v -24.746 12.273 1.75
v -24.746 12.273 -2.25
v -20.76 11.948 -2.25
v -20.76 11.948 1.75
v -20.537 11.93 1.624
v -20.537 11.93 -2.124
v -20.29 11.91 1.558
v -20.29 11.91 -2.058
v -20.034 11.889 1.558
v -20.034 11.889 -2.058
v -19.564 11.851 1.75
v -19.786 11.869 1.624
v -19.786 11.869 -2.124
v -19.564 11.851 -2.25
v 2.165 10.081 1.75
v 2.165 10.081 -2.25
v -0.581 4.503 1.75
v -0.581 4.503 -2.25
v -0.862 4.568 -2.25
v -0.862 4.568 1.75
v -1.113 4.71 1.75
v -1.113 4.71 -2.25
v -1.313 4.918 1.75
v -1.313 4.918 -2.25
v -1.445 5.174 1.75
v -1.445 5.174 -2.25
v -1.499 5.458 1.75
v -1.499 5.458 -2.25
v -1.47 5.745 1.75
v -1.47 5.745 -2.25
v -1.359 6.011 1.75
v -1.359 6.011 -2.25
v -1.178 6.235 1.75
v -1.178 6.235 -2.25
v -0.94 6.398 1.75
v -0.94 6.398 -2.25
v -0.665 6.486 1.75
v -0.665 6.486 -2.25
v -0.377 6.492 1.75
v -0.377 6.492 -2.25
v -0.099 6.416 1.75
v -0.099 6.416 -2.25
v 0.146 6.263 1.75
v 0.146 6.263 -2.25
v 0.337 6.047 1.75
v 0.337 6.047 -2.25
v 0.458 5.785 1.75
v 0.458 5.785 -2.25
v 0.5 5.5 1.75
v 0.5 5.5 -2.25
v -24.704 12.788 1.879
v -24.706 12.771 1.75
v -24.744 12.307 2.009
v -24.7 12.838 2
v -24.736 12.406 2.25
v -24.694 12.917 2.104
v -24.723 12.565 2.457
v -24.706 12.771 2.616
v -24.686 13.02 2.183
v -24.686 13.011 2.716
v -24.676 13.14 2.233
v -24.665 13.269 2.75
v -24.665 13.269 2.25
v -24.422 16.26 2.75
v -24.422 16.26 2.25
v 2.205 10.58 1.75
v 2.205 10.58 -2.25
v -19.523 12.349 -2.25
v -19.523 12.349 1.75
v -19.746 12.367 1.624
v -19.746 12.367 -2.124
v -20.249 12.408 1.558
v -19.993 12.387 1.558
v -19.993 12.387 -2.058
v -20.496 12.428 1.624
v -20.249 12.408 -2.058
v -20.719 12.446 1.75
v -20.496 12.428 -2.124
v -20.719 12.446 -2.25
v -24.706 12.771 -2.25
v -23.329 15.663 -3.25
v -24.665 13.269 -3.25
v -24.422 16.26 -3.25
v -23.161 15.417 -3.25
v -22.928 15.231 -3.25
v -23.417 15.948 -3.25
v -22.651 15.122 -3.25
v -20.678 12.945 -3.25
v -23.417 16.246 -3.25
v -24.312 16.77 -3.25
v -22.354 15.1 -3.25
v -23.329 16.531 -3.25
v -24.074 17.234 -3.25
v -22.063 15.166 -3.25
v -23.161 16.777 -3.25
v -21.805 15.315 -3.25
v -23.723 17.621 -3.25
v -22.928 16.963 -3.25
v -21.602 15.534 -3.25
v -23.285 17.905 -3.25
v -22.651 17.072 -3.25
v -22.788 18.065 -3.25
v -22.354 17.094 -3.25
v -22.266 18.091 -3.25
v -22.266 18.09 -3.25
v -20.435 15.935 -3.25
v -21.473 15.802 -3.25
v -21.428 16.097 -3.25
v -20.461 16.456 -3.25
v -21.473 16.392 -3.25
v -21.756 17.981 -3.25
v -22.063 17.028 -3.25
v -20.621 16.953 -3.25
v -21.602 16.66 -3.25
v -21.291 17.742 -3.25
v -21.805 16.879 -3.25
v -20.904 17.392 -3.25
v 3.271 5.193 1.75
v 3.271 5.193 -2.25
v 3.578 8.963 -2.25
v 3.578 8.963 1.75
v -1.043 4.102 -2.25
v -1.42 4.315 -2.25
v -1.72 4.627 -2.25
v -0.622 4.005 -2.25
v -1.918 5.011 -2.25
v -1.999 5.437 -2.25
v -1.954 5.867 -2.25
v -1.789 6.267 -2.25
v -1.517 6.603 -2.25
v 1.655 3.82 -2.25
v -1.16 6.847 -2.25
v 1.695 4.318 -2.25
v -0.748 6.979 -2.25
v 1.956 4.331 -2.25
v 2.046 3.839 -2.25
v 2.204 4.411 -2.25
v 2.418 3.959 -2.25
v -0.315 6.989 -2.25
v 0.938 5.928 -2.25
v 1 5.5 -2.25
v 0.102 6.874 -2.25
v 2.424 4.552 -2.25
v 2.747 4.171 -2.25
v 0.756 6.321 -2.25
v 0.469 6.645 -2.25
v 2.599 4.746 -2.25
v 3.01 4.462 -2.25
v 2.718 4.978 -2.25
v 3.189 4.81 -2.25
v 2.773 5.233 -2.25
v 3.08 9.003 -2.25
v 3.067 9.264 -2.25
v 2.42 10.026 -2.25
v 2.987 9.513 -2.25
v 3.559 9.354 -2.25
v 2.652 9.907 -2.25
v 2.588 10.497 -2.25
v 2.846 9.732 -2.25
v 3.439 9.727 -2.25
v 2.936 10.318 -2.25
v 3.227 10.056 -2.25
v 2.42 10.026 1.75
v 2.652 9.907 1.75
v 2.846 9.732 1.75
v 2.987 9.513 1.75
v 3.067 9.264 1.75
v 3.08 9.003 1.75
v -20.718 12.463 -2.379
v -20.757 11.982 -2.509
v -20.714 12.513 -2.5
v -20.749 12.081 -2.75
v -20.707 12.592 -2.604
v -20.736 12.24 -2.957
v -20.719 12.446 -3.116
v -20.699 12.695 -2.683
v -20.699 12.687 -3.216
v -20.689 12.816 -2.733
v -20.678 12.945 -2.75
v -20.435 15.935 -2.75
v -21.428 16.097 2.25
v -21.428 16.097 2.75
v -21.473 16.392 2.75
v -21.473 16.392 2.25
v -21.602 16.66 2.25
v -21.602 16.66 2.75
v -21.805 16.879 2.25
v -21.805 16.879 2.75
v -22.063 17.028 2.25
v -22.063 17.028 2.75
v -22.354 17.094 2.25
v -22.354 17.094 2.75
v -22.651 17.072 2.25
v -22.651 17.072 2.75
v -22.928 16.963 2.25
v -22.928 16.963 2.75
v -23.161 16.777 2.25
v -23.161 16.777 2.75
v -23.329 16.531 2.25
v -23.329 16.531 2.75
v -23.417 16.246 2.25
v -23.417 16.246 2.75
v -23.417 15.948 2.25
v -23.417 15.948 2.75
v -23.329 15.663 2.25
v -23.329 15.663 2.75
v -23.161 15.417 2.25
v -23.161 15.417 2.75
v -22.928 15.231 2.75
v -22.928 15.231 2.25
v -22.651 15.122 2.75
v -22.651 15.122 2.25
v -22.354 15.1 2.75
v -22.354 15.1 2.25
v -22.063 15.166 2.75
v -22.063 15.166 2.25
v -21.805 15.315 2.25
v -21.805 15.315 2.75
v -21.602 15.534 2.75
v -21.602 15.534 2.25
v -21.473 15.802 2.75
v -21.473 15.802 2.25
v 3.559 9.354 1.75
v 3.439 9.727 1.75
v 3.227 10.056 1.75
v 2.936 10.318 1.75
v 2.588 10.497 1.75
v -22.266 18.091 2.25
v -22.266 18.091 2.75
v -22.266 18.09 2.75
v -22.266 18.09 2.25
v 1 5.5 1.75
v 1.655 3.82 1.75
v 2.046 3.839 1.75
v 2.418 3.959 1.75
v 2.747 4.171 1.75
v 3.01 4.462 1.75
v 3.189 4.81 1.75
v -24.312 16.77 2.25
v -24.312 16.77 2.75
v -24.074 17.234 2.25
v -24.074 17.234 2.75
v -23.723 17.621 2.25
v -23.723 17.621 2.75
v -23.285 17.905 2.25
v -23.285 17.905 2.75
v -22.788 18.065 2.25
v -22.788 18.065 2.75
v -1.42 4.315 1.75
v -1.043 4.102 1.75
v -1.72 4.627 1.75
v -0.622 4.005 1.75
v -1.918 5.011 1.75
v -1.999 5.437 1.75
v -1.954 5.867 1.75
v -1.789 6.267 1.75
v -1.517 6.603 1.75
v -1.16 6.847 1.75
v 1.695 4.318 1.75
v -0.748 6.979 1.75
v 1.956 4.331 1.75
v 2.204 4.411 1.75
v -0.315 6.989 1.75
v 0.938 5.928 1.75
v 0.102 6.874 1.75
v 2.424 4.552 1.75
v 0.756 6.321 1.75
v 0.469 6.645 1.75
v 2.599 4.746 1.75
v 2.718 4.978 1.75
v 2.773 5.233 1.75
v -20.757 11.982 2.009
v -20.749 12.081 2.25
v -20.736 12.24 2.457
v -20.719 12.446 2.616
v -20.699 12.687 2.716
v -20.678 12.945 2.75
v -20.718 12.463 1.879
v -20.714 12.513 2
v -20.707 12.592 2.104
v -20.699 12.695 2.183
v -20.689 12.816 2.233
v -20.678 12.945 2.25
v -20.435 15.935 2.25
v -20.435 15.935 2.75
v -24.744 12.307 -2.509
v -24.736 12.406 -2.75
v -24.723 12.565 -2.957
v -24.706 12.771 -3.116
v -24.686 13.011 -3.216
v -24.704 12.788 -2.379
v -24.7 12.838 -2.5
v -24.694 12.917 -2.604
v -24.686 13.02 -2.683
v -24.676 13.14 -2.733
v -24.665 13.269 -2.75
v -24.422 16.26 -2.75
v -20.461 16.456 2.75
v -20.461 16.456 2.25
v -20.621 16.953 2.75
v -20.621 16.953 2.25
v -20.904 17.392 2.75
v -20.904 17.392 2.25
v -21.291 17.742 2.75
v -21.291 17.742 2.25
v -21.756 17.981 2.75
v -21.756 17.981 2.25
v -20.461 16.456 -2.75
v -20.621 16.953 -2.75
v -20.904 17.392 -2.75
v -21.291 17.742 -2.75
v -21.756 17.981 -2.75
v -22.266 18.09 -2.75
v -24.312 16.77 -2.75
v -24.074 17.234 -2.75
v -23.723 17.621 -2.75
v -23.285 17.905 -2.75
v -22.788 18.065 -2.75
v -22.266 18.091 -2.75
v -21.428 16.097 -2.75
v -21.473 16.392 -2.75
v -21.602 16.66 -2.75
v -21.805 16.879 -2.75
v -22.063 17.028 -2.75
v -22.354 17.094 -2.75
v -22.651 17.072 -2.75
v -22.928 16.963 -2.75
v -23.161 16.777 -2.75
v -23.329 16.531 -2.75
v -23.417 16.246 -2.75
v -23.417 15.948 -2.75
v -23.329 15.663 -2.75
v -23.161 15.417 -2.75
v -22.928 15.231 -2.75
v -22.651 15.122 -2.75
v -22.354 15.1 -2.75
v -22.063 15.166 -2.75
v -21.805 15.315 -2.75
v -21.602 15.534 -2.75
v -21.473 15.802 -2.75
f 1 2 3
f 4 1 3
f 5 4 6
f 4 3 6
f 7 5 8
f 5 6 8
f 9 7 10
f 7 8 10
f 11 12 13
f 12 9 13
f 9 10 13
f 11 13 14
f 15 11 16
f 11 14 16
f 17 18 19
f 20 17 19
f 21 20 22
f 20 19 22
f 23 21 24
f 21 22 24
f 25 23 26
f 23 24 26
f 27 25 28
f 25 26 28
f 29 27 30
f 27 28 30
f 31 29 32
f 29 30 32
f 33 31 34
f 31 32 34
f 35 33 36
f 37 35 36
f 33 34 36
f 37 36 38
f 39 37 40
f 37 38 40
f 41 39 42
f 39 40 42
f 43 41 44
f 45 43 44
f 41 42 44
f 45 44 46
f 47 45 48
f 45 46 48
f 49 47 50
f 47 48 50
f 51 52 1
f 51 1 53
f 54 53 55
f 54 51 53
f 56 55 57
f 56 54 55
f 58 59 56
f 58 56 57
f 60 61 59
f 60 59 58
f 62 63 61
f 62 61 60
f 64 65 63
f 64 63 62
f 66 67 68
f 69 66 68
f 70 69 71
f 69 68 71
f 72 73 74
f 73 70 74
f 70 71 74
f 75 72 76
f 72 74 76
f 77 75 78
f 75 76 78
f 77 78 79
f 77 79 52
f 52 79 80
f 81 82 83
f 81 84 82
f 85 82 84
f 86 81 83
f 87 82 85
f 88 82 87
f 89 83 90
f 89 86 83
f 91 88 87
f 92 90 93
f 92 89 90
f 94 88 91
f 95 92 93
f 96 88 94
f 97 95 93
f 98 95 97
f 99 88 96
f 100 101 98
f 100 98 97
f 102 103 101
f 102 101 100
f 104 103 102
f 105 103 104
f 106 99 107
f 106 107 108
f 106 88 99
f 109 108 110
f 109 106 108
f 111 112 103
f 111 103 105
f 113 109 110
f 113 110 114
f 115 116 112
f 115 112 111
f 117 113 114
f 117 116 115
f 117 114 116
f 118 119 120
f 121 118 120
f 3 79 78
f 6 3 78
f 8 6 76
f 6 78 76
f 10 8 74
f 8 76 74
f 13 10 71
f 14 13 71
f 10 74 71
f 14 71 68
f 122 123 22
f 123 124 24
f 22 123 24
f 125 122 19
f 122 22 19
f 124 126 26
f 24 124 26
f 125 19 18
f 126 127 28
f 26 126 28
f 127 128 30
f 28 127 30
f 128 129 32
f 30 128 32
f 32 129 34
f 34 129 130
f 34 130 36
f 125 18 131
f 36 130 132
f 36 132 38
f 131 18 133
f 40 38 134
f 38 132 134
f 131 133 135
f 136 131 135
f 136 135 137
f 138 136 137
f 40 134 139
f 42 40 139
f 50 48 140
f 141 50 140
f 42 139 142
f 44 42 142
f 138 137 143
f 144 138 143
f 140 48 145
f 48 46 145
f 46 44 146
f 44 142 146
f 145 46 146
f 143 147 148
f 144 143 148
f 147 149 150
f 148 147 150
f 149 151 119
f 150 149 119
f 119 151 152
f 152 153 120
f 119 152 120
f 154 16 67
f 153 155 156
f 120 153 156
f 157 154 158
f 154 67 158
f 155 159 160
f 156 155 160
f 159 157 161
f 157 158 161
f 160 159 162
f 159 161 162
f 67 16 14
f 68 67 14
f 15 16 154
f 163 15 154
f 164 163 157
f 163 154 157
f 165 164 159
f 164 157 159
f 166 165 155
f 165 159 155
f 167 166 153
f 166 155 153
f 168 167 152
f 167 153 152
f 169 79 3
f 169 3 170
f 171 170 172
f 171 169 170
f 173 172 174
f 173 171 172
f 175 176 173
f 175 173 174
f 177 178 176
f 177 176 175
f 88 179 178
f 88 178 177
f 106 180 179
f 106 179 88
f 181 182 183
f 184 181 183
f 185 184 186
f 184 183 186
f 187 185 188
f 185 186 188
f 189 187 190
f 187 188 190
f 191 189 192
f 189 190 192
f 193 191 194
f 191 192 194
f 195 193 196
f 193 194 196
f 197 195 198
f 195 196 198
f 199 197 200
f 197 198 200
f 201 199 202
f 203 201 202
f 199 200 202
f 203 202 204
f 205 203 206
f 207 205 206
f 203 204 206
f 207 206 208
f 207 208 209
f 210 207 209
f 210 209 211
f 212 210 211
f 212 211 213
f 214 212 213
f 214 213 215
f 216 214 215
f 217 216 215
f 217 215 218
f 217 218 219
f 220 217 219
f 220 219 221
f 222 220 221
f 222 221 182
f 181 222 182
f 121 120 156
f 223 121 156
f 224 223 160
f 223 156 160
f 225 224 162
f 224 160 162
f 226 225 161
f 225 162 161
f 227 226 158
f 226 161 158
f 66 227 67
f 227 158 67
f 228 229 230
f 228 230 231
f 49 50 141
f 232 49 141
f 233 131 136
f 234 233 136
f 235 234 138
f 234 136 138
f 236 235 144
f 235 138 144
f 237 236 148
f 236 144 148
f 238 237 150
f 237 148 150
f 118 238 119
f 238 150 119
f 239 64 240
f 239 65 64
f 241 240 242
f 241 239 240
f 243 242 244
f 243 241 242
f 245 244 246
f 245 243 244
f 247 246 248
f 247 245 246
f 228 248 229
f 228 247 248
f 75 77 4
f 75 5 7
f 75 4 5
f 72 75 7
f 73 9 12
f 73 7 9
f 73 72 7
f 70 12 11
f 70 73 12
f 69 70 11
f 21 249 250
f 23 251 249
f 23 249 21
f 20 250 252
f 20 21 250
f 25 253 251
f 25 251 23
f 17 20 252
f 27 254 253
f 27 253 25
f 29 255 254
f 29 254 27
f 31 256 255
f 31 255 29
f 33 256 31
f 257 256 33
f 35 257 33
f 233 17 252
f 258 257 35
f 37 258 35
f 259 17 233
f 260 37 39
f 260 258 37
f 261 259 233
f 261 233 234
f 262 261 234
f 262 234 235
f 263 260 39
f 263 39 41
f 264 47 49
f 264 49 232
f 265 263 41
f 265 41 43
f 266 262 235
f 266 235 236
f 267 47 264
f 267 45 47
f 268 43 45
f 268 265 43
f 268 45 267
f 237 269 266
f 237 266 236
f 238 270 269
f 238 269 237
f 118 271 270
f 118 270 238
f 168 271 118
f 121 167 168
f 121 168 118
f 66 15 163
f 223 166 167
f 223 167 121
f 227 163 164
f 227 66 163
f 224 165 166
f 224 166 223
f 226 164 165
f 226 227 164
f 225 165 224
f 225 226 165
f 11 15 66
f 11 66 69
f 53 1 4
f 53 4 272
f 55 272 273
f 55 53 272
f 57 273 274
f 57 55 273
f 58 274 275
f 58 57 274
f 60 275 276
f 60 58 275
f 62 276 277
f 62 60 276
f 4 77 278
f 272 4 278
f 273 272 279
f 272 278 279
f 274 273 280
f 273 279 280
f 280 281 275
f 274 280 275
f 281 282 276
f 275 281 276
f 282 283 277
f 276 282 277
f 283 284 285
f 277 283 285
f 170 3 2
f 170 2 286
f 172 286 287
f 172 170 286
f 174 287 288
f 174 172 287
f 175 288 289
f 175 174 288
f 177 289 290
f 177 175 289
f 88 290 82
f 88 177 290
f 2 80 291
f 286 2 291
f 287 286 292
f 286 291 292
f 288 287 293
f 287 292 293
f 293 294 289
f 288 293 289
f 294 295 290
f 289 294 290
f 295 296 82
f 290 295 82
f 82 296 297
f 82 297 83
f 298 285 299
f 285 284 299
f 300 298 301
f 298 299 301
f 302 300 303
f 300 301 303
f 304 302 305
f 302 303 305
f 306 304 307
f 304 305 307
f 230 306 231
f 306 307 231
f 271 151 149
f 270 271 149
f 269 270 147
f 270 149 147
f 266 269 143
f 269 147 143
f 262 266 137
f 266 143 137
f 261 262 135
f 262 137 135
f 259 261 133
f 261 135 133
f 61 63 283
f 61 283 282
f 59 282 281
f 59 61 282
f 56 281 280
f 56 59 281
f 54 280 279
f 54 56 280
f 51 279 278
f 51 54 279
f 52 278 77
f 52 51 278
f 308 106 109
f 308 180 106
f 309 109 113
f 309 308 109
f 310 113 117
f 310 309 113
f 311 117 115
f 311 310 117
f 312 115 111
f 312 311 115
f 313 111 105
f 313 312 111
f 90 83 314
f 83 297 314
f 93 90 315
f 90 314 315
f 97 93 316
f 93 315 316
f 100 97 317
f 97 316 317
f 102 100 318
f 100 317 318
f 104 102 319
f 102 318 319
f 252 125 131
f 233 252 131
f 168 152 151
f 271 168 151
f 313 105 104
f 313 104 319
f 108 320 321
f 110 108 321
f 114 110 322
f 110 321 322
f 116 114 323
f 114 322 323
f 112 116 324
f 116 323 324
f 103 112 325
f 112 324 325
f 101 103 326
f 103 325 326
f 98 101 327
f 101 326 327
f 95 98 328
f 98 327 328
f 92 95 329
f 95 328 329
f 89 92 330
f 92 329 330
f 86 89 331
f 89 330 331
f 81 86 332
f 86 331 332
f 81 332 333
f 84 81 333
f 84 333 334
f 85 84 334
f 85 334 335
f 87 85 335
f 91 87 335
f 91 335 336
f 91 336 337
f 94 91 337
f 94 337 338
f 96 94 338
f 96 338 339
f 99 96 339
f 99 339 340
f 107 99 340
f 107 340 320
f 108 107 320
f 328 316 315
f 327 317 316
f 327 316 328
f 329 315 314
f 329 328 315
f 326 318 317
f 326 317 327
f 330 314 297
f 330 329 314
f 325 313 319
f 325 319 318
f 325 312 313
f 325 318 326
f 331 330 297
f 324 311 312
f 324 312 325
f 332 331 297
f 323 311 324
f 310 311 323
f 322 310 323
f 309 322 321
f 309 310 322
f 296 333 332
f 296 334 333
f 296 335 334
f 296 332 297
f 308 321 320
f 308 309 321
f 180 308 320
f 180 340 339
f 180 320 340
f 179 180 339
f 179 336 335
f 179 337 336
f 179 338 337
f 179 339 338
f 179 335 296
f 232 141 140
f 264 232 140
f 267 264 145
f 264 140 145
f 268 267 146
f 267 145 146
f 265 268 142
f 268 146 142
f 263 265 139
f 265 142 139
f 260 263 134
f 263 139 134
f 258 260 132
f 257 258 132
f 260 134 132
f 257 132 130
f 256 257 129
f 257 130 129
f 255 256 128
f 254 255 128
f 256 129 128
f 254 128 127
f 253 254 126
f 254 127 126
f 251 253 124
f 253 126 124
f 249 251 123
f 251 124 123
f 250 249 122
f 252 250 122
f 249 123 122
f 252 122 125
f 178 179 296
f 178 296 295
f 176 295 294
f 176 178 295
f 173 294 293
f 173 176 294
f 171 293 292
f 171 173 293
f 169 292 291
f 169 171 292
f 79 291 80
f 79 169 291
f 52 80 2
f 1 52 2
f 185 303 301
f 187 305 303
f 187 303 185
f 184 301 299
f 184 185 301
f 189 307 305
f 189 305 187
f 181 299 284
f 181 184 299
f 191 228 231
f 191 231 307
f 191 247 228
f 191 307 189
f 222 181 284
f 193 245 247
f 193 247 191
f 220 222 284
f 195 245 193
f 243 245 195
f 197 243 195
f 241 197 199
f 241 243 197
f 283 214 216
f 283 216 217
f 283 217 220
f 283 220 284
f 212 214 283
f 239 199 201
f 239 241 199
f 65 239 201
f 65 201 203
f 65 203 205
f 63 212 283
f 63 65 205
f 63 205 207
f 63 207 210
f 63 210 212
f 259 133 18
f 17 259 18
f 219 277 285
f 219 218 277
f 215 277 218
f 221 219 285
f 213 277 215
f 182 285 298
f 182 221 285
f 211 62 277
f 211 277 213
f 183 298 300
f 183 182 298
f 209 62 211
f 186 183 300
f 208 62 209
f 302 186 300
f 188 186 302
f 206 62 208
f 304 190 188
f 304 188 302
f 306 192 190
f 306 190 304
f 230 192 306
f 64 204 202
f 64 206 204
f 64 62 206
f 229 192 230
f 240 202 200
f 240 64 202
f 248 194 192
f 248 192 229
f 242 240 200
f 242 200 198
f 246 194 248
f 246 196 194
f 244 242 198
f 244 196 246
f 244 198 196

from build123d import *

# Parameters (mm, degrees)
ODGI_CIE_BAZOWE1_DEPTH      = 1.75
ODGI_CIE_BAZOWE1_DEPTH_BACK = 2.25
WYTNIJ_WYCI_GNI_CIE1_REACH  = 28.618
ODGI_CIE_KRAW_DZI1_DEPTH    = 4
ODGI_CIE_KRAW_DZI2_DEPTH    = 4
SZKIC13_R                   = 1
WYTNIJ_WYCI_GNI_CIE2_DEPTH  = 32.329703674
ZAOKR_GLENIE1_R             = 2


# Sheet-metal steps are written as plain solids
with BuildPart() as part:
    # Szkic1 → Odgięcie bazowe1 (new, two sides: drawn at the far end of the back side and taken through both)
    with BuildSketch(Plane.XY.offset(-ODGI_CIE_BAZOWE1_DEPTH_BACK)):
        with BuildLine():
            Line((-24.746406247, 12.272623445), (2.164511805, 10.081165123))
            ThreePointArc((2.164511805, 10.081165123), (2.845512893, 9.731845847), (3.080047351, 9.003299331))
            Line((3.080047351, 9.003299331), (2.773055226, 5.233462675))
            ThreePointArc((2.773055226, 5.233462675), (2.42373595, 4.552461587), (1.695189434, 4.317927129))
            Line((1.695189434, 4.317927129), (-0.581165123, 4.503299331))
            ThreePointArc((-0.581165123, 4.503299331), (-1.177803392, 6.235243199), (0.5, 5.5))
            Line((0.5, 5.5), (1, 5.5))
            ThreePointArc((1, 5.5), (-1.516705088, 6.602864798), (-0.621747685, 4.004948997))
            Line((-0.621747685, 4.004948997), (1.654606873, 3.819576795))
            ThreePointArc((1.654606873, 3.819576795), (2.747426646, 4.171378482), (3.27140556, 5.192880113))
            Line((3.27140556, 5.192880113), (3.578397685, 8.96271677))
            ThreePointArc((3.578397685, 8.96271677), (3.226595998, 10.055536543), (2.205094367, 10.579515457))
            Line((2.205094367, 10.579515457), (-24.705823686, 12.77097378))
            Line((-24.705823686, 12.77097378), (-24.746406247, 12.272623445))
        make_face()
    extrude(amount=ODGI_CIE_BAZOWE1_DEPTH + ODGI_CIE_BAZOWE1_DEPTH_BACK)

    # Szkic6 → Wytnij-wyciągnięcie1 (cut, up to next)
    with BuildSketch(Plane(origin=(0.870381249, 10.688206219, 0), x_dir=(0.9967006686068912, -0.08116512304294364, 0), z_dir=(0.08116512304294363, 0.9967006686068911, 0)), mode=Mode.PRIVATE) as wytnij_wyci_gni_cie1_sk1:
        with BuildLine():
            Line((-20.460868644, -1.75), (-21.660868644, -1.75))
            ThreePointArc((-21.660868644, -1.75), (-21.060868644, -1.55), (-20.460868644, -1.75))
        make_face()
    wytnij_wyci_gni_cie1_tool1 = extrude(wytnij_wyci_gni_cie1_sk1.sketch, amount=-WYTNIJ_WYCI_GNI_CIE1_REACH, mode=Mode.PRIVATE) & part.part
    # Szkic6 → Wytnij-wyciągnięcie1 (cut, up to next)
    with BuildSketch(Plane(origin=(0.870381249, 10.688206219, 0), x_dir=(0.9967006686068912, -0.08116512304294364, 0), z_dir=(0.08116512304294363, 0.9967006686068911, 0)), mode=Mode.PRIVATE) as wytnij_wyci_gni_cie1_sk2:
        with BuildLine():
            Line((-20.460868644, 2.25), (-21.660868644, 2.25))
            ThreePointArc((-21.660868644, 2.25), (-21.060868644, 2.05), (-20.460868644, 2.25))
        make_face()
    wytnij_wyci_gni_cie1_tool2 = extrude(wytnij_wyci_gni_cie1_sk2.sketch, amount=-WYTNIJ_WYCI_GNI_CIE1_REACH, mode=Mode.PRIVATE) & part.part
    add(wytnij_wyci_gni_cie1_tool1.solids().sort_by_distance((-20.121001, 12.397614, 1.669272))[0], mode=Mode.SUBTRACT)
    add(wytnij_wyci_gni_cie1_tool2.solids().sort_by_distance((-20.121001, 12.397614, -2.169272))[0], mode=Mode.SUBTRACT)

    # Odgięcie krawędzi1 section (across the edge) → Odgięcie krawędzi1 (add)
    with BuildSketch(Plane(origin=(-24.705823686, 12.77097378, 2.25), x_dir=(0, 0, -1), z_dir=(0.9967006686068913, -0.08116512304294192, 0))):
        with BuildLine():
            Line((-0.5, 0.5), (-0.5, 5.5))
            Line((-0.5, 5.5), (0, 5.5))
            Line((0, 5.5), (0, 0.5))
            ThreePointArc((0, 0.5), (0.146446609, 0.146446609), (0.5, 0))
            Line((0.5, 0), (0.5, -0.5))
            ThreePointArc((0.5, -0.5), (-0.207106781, -0.207106781), (-0.5, 0.5))
        make_face()
    extrude(amount=ODGI_CIE_KRAW_DZI1_DEPTH)

    # Odgięcie krawędzi2 section (across the edge) → Odgięcie krawędzi2 (add)
    with BuildSketch(Plane(origin=(-20.719021011, 12.446313287, -2.75), x_dir=(0, 0, 1), z_dir=(-0.9967006686068913, 0.08116512304294192, 0))):
        with BuildLine():
            Line((-0.5, 0.5), (-0.5, 5.5))
            Line((-0.5, 5.5), (0, 5.5))
            Line((0, 5.5), (0, 0.5))
            ThreePointArc((0, 0.5), (0.146446609, 0.146446609), (0.5, 0))
            Line((0.5, 0), (0.5, -0.5))
            ThreePointArc((0.5, -0.5), (-0.207106781, -0.207106781), (-0.5, 0.5))
        make_face()
    extrude(amount=ODGI_CIE_KRAW_DZI2_DEPTH)

    # Szkic13 → Wytnij-wyciągnięcie2 (cut, through all)
    with BuildSketch(Plane.XY.offset(2.75)):
        with Locations((-22.428344418, 16.097095874)):
            Circle(SZKIC13_R)
    extrude(amount=-WYTNIJ_WYCI_GNI_CIE2_DEPTH, mode=Mode.SUBTRACT)

    # Zaokrąglenie1
    zaokr_glenie1_edges = [part.edges().sort_by_distance(p)[0] for p in [
        (-24.259415509, 18.252827457, -3),
        (-20.272612835, 17.928166965, -3),
        (-20.272612835, 17.928166965, 2.5),
        (-24.259415509, 18.252827457, 2.5),
    ]]
    fillet(zaokr_glenie1_edges, radius=ZAOKR_GLENIE1_R - 0.0001)  # a hair under: the kernel refuses the full size


solid = part.part
